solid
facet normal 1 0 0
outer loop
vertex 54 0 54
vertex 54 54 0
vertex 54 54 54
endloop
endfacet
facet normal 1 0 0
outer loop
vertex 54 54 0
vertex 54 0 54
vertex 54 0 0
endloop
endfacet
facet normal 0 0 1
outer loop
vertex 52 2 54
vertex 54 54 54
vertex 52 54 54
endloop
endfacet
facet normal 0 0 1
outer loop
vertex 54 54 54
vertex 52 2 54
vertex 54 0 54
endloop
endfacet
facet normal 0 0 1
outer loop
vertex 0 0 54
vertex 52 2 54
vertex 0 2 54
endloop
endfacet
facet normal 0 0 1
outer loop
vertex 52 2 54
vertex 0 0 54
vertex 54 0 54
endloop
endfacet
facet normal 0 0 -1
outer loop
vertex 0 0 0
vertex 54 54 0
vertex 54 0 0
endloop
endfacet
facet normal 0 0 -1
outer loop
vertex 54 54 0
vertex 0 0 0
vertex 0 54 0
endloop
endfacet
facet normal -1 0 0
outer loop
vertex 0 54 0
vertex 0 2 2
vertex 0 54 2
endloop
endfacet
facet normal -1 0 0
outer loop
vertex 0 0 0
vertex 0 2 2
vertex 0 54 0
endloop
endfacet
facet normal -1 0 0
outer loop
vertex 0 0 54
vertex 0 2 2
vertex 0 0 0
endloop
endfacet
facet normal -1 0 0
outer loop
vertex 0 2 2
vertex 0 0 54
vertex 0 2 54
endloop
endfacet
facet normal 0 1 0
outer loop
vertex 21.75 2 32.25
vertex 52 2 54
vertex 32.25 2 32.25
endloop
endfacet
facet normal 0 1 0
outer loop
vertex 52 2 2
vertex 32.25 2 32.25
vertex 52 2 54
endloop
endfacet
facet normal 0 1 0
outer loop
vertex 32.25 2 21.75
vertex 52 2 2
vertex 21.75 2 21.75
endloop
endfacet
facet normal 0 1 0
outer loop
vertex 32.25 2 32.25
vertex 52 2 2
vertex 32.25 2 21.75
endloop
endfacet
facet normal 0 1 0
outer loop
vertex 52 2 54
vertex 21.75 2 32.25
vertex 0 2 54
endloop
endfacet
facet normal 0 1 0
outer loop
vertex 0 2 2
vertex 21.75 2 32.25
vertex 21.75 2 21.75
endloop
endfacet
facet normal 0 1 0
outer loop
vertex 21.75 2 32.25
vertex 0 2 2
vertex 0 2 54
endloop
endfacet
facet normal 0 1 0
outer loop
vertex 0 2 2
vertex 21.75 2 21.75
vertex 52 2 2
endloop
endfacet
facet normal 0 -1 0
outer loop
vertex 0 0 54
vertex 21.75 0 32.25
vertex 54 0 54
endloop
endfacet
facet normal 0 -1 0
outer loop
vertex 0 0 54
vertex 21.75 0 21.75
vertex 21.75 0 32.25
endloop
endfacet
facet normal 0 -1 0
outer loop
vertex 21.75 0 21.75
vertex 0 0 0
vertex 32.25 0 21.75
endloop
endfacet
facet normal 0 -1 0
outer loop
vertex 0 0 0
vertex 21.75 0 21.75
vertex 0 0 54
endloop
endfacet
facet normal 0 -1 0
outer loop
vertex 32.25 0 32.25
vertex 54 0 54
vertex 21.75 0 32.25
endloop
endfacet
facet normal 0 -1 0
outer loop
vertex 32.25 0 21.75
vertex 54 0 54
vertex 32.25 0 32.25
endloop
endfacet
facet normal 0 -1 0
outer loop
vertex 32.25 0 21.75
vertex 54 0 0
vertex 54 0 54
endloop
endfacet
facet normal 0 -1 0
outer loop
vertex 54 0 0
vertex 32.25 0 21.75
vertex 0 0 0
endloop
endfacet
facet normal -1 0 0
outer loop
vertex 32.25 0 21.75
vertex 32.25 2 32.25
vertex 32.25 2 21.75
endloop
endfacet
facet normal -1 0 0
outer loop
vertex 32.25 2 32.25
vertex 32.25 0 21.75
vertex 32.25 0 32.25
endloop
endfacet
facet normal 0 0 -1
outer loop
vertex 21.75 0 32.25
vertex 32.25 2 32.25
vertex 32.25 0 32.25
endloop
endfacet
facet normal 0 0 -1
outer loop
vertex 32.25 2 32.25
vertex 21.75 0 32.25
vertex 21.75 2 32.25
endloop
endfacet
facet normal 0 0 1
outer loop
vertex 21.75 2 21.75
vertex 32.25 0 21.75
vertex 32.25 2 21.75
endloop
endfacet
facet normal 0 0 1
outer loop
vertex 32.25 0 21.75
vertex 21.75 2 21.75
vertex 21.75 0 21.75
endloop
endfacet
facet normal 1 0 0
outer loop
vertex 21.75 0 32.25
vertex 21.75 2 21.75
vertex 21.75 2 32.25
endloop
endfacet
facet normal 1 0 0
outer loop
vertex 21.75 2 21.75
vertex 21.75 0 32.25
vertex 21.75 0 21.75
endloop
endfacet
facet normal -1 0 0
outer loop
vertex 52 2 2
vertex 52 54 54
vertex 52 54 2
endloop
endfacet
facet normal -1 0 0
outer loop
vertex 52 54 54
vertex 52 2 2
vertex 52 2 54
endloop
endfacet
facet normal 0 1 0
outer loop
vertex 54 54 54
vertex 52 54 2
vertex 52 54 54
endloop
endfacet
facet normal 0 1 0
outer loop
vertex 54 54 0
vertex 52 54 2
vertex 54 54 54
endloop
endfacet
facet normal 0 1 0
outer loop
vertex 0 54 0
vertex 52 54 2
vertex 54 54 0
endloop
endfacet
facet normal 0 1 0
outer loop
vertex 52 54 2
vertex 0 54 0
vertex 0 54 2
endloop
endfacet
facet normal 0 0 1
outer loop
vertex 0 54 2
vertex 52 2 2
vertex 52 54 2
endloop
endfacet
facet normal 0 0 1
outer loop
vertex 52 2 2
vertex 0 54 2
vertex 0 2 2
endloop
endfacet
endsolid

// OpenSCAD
// Outer width of the "box" that contains the camera
BODY_OUT_W = 54;

// Thickness of the walls of the "box" that contains the camera
PANEL_THICK = 2;

// Inner width of the "box" that contains the camera
BODY_IN_W = BODY_OUT_W - 2 * PANEL_THICK;

// Margin to apply when performing differences
MARGIN = 1;

// With of the camera hole
HOLE_W = 10.5;

// Deep of the screws
SCREW_DEEP = 5;

CAMERA_SUPPORT_THICK = 5;
CAMERA_JOINT_H = 5;

// Dimensions of the servo supports
SERVO_SUPPORT_DEEP = 30.9;
SERVO_SUPPORT_W = 6.3;

// Circles resolution
FN = 64;

// Front panel
difference() {
    cube([BODY_OUT_W, PANEL_THICK, BODY_OUT_W]);

    // Camera hole
    translate([BODY_OUT_W / 2.0, MARGIN, BODY_OUT_W / 2.0]) {
        cube([HOLE_W, PANEL_THICK + 2 * MARGIN, HOLE_W], center = true);
    }
}

// Camera support
translate ([BODY_OUT_W / 2.0, CAMERA_SUPPORT_THICK + PANEL_THICK, BODY_OUT_W / 2.0]) {
    rotate ([90, 0, 0]) {
        linear_extrude(height = CAMERA_SUPPORT_THICK) {
            import(file = "../drawings/camera.dxf", layer = "openscad-camera-support", $fn=FN);
        }
    }
}

// Camera joint
translate ([BODY_OUT_W / 2.0, CAMERA_JOINT_H + PANEL_THICK, BODY_OUT_W / 2.0]) {
    rotate ([90, 0, 0]) {
        linear_extrude(height = CAMERA_JOINT_H) {
            import(file = "../drawings/camera.dxf", layer = "openscad-camera-joint", $fn=FN);
        }
    }
}

// Screw holes
difference () {
translate ([BODY_OUT_W / 2.0, BODY_IN_W + PANEL_THICK, BODY_OUT_W / 2.0]) {
rotate ([90, 0, 0]) {
linear_extrude(height = BODY_IN_W) {
    import(file = "../drawings/camera.dxf", layer = "openscad-screws", $fn=FN);
}
}
}
translate ([BODY_OUT_W / 2.0, BODY_IN_W + PANEL_THICK + MARGIN, BODY_OUT_W / 2.0]) {
rotate ([90, 0, 0]) {
linear_extrude(height = SCREW_DEEP + MARGIN) {
    import(file = "../drawings/camera.dxf", layer = "openscad-screws-2", $fn=FN);
}
}
}
}

// Servo support
difference () {
translate ([BODY_OUT_W / 2.0, SERVO_SUPPORT_DEEP + PANEL_THICK, BODY_OUT_W / 2.0]) {
rotate ([90, 0, 0]) {
linear_extrude(height = SERVO_SUPPORT_DEEP) {
    import(file = "../drawings/camera.dxf", layer = "openscad-servo-support", $fn=FN);
}
}
}
translate ([BODY_OUT_W - PANEL_THICK - SERVO_SUPPORT_W - MARGIN, BODY_OUT_W / 2.0, BODY_OUT_W / 2.0]) {
rotate ([90, 0, 90]) {
linear_extrude(height = SCREW_DEEP + MARGIN) {
    import(file = "../drawings/camera.dxf", layer = "openscad-servo-screws", $fn=FN);
}
}
}
}

// Bottom panel
cube([BODY_OUT_W, BODY_OUT_W, PANEL_THICK]);

// Right panel
difference () {
translate([BODY_OUT_W - PANEL_THICK, 0, 0]) {
    cube([PANEL_THICK, BODY_OUT_W, BODY_OUT_W]);
}
translate ([BODY_OUT_W - PANEL_THICK - MARGIN, BODY_OUT_W / 2.0, BODY_OUT_W / 2.0]) {
rotate ([90, 0, 90]) {
linear_extrude(height = PANEL_THICK + MARGIN * 2) {
    import(file = "../drawings/camera.dxf", layer = "openscad-servo-hole", $fn=FN);
}
}
}
}
